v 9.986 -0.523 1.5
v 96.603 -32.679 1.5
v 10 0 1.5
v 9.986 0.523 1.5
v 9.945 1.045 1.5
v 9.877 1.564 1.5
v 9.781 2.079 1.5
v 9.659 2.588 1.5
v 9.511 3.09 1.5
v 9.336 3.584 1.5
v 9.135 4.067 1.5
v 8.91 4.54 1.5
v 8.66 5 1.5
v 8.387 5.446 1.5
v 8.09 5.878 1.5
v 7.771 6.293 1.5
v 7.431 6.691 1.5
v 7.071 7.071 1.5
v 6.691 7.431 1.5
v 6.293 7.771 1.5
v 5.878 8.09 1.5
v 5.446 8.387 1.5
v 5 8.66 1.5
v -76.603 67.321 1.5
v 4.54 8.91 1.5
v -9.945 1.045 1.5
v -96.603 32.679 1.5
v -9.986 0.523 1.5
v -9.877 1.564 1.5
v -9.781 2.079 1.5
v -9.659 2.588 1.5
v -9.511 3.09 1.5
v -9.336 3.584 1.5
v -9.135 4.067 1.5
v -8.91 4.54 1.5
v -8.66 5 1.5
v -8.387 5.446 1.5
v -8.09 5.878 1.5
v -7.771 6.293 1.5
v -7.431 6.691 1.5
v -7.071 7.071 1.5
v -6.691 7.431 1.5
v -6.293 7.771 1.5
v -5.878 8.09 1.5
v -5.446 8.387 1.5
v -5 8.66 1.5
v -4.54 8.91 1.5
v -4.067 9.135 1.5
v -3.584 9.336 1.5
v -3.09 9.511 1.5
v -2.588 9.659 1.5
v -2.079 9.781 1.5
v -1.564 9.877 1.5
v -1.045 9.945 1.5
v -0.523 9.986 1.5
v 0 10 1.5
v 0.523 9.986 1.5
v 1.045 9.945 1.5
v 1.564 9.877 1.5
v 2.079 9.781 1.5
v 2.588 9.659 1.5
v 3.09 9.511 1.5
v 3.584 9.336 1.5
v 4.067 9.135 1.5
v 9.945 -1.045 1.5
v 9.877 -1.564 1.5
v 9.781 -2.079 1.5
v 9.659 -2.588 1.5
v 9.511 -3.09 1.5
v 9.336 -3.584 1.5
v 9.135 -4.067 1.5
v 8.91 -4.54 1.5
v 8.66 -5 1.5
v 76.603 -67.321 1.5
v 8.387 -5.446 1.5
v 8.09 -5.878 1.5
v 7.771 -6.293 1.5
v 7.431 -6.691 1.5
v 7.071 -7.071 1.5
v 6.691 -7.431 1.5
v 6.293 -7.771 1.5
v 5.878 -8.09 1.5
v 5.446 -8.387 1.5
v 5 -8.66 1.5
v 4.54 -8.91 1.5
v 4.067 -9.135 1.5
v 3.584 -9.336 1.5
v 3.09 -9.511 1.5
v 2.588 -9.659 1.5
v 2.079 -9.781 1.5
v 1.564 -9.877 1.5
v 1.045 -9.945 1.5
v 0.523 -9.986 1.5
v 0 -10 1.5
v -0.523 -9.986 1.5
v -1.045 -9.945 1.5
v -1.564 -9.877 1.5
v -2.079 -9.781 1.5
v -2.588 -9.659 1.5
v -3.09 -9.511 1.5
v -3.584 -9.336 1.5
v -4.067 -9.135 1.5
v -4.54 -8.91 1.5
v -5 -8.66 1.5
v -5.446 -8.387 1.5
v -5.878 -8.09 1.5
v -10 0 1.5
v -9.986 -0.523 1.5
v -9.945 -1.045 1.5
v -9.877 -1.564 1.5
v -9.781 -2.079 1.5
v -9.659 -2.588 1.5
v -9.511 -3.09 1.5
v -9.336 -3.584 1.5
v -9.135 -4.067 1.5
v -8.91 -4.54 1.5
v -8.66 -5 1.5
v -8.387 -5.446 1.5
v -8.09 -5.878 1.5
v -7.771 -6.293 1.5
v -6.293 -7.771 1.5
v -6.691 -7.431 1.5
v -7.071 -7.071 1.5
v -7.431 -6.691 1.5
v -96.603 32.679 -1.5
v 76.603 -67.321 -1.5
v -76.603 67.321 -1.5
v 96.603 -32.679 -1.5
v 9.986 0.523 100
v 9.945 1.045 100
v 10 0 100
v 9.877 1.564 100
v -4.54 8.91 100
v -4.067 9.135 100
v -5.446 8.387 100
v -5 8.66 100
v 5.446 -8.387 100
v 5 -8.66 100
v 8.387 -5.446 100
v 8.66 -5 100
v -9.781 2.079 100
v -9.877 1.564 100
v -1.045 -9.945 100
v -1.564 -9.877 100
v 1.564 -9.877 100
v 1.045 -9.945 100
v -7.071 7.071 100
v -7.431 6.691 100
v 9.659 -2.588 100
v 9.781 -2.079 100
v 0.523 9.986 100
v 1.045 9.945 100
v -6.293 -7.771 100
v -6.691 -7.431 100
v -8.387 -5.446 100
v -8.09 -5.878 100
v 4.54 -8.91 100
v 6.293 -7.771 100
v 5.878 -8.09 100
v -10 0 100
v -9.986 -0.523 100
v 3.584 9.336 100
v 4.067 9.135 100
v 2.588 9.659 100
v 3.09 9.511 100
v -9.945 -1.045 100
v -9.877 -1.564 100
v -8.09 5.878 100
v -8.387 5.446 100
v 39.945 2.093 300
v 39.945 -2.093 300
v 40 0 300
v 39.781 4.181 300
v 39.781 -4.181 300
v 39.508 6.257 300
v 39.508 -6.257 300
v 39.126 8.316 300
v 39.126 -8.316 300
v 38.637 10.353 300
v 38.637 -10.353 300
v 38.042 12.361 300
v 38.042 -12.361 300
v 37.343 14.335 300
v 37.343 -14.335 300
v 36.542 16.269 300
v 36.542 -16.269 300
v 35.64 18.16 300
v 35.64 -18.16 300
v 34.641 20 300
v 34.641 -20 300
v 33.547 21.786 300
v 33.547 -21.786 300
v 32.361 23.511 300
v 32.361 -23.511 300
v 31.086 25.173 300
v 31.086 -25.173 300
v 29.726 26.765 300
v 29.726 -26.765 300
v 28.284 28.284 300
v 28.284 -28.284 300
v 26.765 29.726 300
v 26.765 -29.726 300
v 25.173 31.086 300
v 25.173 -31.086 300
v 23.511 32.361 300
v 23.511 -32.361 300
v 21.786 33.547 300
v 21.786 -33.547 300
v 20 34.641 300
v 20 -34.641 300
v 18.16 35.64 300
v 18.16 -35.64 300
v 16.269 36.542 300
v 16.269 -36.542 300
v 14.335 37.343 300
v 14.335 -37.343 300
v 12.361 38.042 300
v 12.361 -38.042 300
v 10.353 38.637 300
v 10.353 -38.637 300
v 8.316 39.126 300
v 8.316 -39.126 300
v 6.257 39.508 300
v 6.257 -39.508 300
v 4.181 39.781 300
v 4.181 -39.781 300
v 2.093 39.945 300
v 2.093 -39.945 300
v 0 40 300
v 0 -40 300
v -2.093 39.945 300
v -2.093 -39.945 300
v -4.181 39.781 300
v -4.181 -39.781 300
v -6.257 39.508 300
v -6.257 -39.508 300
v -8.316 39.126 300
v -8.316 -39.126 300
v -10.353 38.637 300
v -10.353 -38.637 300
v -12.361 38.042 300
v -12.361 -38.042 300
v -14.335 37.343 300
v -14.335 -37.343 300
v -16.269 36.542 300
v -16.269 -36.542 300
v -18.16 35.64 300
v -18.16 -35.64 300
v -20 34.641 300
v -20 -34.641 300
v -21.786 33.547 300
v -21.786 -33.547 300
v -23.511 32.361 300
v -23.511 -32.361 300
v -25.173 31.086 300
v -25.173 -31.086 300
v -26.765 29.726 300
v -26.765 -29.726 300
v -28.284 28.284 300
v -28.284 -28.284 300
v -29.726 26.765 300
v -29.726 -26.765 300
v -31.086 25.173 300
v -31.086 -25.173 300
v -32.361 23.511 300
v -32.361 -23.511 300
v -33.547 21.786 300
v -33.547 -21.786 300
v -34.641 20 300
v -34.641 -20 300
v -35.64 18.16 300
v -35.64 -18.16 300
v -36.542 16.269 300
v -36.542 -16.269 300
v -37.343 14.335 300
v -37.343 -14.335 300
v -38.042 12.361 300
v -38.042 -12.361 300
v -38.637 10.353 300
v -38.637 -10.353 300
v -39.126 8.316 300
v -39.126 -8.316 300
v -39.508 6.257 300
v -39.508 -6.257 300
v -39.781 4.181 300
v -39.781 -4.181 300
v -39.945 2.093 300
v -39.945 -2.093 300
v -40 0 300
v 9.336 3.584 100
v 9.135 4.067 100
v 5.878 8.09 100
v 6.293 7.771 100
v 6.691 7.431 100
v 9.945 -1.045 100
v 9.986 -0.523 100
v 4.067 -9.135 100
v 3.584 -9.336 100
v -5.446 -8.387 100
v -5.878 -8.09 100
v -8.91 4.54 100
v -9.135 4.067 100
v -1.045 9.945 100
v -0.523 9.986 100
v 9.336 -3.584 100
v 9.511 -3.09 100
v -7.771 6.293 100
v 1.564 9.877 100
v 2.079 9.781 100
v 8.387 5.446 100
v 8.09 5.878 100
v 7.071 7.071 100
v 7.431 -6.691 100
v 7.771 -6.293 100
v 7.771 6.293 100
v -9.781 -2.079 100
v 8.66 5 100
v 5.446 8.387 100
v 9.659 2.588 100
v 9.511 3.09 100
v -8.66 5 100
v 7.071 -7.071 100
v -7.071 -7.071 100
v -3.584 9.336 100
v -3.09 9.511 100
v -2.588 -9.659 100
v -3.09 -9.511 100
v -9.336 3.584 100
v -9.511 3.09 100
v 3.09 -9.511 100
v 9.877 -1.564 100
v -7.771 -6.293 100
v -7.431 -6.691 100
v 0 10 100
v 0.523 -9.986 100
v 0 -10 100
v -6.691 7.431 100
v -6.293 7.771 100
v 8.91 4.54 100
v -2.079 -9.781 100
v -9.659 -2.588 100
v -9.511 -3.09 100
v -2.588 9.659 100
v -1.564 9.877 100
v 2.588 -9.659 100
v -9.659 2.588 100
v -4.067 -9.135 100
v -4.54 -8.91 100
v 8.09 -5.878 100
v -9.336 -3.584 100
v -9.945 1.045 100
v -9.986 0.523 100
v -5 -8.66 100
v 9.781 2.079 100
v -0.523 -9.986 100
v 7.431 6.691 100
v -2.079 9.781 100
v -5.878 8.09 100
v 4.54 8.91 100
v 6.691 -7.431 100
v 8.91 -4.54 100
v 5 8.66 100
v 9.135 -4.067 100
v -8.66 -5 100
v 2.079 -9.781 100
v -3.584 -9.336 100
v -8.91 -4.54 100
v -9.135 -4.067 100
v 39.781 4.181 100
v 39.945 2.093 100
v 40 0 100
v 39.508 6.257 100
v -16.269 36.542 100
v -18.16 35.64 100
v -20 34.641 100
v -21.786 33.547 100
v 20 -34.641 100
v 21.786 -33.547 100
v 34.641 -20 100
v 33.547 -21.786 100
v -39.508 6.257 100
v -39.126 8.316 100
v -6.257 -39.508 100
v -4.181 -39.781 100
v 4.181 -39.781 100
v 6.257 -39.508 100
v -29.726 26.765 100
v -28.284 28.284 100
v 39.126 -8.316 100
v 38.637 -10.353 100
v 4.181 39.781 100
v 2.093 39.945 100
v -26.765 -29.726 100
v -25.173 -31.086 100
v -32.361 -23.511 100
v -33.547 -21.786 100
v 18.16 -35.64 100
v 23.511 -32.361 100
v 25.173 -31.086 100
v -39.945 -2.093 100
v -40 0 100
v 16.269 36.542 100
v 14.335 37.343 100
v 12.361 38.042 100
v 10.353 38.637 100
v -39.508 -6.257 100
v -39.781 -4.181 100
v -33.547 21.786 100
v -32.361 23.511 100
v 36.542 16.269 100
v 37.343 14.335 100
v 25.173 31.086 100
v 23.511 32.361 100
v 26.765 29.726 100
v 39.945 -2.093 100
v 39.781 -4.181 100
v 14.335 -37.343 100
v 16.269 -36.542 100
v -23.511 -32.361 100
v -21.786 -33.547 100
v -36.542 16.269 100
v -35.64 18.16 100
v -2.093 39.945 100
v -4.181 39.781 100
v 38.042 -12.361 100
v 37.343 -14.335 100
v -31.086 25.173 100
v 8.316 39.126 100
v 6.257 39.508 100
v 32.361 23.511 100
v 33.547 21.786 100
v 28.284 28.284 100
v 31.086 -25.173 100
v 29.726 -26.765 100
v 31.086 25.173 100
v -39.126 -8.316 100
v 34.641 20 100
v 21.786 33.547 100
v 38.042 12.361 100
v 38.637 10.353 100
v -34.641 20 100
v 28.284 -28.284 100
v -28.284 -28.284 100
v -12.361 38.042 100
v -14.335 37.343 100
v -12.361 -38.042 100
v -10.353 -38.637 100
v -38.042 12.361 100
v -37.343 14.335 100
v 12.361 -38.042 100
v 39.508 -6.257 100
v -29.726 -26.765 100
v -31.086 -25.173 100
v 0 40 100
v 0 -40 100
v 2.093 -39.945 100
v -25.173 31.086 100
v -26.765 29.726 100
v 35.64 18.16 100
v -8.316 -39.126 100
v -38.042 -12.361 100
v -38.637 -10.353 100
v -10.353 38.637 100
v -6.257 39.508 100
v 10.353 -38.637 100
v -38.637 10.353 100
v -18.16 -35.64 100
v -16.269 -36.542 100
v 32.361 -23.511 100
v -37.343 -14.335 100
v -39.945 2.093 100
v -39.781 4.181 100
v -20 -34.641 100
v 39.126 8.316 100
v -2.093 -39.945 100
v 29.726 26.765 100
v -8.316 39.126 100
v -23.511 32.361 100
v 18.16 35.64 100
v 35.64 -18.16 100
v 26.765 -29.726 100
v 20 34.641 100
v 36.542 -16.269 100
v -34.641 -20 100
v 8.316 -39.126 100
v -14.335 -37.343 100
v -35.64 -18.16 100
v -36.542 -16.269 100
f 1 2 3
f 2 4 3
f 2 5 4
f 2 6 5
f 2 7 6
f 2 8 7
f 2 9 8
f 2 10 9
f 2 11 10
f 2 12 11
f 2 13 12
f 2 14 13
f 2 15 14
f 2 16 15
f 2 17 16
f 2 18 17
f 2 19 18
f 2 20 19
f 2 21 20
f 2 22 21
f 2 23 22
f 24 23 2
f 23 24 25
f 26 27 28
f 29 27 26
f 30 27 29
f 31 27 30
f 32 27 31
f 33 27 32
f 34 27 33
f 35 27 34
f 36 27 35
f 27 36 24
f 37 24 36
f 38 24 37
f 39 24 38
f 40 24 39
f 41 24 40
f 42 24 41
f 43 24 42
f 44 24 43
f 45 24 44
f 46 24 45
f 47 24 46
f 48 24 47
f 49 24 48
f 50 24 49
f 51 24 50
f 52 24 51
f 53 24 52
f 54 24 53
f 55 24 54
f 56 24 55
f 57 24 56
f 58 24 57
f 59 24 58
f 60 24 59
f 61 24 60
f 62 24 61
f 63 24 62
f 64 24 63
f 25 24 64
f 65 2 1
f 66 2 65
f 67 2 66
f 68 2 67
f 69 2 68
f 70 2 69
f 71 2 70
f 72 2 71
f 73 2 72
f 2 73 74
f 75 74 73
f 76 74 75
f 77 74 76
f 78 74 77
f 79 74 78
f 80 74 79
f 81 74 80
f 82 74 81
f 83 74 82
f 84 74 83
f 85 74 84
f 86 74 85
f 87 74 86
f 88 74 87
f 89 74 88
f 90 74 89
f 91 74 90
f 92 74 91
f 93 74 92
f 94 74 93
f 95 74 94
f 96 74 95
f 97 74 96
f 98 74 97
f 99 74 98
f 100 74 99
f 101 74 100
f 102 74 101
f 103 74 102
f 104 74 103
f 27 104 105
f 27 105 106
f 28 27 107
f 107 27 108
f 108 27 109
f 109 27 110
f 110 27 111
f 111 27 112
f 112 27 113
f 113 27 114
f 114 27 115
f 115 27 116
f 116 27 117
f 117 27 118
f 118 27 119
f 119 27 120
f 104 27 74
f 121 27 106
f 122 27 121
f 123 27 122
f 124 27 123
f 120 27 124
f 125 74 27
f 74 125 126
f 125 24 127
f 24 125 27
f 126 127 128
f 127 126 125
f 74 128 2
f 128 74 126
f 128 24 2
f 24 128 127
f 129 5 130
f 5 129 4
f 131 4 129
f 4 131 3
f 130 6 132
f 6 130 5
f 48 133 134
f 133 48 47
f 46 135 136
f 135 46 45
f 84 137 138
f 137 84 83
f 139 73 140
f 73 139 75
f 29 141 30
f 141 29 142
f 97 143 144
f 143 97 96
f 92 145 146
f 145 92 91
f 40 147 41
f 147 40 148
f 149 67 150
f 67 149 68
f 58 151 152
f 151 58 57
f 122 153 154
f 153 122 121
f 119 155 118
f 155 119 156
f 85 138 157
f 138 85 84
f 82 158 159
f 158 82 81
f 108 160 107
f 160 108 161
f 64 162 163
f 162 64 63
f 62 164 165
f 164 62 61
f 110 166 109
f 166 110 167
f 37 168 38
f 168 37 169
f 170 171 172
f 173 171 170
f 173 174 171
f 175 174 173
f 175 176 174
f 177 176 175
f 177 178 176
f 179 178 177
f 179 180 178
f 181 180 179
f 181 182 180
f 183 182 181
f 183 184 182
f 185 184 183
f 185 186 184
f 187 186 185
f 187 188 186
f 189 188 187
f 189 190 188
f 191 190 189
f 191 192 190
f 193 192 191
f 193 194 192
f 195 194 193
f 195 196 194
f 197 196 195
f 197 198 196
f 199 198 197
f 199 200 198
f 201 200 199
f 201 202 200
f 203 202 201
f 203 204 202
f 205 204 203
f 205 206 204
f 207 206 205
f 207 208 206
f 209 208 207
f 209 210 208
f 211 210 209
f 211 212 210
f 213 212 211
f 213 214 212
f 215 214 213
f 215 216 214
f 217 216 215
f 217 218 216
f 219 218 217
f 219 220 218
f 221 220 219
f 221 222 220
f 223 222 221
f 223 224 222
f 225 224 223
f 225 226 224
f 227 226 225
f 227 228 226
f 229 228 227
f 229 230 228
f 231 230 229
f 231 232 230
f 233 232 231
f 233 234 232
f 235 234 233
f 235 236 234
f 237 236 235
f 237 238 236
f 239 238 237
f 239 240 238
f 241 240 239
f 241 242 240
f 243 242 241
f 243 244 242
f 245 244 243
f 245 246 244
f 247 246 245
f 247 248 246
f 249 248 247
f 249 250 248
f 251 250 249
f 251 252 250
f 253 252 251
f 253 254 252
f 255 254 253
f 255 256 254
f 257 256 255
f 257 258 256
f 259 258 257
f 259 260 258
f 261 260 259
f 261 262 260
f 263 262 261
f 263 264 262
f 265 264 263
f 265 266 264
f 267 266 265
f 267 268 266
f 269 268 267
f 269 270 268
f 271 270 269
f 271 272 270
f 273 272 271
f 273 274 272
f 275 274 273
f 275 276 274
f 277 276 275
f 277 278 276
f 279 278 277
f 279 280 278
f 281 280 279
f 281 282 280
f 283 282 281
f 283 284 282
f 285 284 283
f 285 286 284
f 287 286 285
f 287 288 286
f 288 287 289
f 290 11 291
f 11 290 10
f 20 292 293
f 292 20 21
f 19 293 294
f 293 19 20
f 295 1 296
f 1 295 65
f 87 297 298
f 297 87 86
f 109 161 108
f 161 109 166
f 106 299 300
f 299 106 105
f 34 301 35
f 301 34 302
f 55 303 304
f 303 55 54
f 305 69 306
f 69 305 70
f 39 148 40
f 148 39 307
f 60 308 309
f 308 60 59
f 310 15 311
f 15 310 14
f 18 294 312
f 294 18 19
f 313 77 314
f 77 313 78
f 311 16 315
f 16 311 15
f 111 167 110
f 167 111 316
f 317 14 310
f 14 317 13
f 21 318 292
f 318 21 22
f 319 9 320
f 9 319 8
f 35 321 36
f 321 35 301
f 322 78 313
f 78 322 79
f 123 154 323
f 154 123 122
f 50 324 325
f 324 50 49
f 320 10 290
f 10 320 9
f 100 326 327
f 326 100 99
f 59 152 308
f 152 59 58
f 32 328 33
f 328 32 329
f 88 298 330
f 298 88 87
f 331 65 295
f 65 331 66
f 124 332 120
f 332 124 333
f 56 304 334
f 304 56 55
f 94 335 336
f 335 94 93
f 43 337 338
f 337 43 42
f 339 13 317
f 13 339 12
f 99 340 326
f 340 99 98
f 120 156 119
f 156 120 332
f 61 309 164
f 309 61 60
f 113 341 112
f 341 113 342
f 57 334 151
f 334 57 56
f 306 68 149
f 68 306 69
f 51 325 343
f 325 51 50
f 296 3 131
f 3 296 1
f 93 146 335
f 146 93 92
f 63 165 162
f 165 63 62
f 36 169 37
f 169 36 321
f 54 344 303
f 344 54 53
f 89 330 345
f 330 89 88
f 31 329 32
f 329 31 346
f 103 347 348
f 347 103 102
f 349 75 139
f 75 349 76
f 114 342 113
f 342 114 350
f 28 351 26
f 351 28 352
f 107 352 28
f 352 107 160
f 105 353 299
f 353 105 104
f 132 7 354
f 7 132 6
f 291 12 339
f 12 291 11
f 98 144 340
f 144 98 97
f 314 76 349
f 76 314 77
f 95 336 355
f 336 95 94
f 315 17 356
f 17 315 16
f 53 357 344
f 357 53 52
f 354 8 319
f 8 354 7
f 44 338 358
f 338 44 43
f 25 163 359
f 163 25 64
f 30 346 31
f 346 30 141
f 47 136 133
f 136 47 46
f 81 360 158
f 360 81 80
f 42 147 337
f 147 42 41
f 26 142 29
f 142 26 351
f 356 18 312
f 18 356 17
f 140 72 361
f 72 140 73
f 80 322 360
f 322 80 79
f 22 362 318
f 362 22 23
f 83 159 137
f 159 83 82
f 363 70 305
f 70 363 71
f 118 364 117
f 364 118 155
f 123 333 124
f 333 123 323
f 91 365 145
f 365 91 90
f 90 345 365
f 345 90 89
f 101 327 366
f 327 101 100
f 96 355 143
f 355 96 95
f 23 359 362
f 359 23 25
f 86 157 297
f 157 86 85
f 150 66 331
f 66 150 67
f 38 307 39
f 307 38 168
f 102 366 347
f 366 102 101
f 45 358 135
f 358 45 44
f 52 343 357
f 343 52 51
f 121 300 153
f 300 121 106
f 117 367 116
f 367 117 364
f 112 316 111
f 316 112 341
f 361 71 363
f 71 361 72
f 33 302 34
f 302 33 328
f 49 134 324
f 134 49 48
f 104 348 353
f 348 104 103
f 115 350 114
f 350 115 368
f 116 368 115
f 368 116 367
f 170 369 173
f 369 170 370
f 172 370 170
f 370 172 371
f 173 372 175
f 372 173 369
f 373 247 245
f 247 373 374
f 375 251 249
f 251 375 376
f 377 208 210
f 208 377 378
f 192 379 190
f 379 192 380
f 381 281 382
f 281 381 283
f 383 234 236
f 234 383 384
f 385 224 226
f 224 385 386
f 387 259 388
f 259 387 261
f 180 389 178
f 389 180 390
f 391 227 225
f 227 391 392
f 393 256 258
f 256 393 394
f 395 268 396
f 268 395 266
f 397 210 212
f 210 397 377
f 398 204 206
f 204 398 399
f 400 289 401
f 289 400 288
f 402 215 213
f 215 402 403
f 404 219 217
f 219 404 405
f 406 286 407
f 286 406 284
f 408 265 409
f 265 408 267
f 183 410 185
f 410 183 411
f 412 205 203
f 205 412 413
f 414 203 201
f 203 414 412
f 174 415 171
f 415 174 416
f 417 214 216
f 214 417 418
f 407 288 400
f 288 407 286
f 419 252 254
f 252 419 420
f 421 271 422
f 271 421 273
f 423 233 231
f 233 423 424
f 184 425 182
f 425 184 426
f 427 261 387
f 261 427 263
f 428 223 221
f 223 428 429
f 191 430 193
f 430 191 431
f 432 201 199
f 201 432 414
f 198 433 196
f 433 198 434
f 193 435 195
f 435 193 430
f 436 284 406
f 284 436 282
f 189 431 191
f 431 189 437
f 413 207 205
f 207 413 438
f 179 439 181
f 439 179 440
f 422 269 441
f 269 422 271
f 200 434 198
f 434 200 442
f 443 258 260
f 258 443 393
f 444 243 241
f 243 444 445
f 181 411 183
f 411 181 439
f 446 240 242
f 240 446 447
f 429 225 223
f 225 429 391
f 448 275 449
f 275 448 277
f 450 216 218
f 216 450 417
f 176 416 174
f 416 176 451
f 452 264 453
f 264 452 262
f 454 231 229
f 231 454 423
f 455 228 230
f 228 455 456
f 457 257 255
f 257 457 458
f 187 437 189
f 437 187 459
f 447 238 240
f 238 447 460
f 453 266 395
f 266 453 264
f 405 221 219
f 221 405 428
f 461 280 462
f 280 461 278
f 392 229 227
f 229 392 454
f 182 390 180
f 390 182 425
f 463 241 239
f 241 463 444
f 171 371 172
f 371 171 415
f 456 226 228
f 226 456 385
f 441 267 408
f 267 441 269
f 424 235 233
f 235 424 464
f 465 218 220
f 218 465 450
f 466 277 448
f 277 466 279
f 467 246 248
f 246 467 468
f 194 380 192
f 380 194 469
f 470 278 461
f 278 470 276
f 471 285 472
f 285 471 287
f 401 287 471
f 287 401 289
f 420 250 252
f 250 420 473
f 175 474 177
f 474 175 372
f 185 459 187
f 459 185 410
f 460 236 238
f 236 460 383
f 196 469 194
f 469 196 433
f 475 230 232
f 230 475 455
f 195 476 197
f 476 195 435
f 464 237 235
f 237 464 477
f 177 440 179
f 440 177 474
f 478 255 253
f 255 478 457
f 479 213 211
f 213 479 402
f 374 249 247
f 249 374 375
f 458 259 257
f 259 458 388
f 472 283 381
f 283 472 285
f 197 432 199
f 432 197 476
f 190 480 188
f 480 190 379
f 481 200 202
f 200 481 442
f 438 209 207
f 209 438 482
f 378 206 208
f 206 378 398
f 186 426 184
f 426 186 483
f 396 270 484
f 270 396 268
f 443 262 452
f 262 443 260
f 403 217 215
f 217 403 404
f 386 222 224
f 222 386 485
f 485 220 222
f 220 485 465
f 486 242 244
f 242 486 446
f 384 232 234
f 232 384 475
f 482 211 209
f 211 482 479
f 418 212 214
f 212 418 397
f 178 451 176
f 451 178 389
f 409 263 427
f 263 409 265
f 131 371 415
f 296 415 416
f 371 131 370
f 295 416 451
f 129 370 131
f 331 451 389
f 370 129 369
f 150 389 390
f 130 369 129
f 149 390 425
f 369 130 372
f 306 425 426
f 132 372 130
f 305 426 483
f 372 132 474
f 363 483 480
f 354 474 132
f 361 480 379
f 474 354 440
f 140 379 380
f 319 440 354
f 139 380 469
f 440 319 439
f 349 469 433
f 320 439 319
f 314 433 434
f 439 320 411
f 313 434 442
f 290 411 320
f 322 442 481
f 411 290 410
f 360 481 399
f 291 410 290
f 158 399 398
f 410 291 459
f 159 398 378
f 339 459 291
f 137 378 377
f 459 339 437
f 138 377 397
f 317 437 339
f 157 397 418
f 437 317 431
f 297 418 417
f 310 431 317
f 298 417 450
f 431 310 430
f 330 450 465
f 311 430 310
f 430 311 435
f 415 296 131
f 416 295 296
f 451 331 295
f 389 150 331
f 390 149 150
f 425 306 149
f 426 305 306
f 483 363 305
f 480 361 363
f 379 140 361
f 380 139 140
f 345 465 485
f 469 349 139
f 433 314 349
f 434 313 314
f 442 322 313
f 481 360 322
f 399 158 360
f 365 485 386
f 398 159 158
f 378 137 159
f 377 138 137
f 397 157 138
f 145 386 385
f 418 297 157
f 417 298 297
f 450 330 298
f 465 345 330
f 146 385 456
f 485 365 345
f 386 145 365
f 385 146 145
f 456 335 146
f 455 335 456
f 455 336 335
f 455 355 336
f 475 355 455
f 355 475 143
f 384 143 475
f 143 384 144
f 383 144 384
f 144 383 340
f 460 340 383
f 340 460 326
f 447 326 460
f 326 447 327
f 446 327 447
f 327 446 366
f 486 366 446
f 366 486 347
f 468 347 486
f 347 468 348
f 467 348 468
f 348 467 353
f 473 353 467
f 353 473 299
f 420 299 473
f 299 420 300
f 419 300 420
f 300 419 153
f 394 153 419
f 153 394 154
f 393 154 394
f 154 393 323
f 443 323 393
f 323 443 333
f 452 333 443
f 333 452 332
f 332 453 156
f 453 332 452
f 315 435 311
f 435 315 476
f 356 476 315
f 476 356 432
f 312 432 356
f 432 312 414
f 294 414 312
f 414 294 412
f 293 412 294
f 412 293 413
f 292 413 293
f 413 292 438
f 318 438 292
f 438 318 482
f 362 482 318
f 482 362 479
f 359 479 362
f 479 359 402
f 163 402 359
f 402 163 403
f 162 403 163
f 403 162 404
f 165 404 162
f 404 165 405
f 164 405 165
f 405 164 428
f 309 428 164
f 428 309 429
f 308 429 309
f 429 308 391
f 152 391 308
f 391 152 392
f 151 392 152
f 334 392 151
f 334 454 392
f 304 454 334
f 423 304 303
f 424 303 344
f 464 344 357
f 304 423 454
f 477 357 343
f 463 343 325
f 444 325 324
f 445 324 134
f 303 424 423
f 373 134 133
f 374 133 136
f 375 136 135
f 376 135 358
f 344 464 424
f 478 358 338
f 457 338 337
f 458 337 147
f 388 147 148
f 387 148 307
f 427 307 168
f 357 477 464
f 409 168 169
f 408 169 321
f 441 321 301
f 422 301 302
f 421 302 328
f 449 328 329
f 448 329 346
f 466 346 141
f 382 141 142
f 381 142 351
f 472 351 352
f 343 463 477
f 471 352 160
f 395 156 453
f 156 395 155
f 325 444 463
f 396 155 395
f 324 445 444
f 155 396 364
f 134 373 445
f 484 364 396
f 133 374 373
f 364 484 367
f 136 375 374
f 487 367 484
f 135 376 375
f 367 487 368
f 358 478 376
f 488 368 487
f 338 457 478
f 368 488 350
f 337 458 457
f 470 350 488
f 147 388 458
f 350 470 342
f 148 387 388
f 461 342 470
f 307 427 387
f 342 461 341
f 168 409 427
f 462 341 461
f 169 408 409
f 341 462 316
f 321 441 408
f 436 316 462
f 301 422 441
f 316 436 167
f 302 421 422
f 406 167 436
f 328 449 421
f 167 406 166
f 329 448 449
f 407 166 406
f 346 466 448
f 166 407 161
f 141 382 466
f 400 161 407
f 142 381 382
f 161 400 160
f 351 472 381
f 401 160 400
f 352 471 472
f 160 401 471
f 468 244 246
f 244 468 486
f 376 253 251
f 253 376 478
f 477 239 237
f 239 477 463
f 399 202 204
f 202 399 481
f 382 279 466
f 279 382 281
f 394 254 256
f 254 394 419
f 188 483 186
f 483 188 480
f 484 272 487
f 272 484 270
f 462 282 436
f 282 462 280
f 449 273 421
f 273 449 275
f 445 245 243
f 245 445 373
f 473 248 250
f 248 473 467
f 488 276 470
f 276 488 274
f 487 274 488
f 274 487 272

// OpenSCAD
use <libs/threads.scad>
$fs=$fs/4;
$fa=$fa/4;

lg = 2000;
sc = 200;

module section(i){
    rotate([0,0,i*60])cube([40,sc, 3], center = true);
    cylinder(r = 10, 300);
    translate([0,0,100])cylinder(r =40, 200);
}

section(1);
